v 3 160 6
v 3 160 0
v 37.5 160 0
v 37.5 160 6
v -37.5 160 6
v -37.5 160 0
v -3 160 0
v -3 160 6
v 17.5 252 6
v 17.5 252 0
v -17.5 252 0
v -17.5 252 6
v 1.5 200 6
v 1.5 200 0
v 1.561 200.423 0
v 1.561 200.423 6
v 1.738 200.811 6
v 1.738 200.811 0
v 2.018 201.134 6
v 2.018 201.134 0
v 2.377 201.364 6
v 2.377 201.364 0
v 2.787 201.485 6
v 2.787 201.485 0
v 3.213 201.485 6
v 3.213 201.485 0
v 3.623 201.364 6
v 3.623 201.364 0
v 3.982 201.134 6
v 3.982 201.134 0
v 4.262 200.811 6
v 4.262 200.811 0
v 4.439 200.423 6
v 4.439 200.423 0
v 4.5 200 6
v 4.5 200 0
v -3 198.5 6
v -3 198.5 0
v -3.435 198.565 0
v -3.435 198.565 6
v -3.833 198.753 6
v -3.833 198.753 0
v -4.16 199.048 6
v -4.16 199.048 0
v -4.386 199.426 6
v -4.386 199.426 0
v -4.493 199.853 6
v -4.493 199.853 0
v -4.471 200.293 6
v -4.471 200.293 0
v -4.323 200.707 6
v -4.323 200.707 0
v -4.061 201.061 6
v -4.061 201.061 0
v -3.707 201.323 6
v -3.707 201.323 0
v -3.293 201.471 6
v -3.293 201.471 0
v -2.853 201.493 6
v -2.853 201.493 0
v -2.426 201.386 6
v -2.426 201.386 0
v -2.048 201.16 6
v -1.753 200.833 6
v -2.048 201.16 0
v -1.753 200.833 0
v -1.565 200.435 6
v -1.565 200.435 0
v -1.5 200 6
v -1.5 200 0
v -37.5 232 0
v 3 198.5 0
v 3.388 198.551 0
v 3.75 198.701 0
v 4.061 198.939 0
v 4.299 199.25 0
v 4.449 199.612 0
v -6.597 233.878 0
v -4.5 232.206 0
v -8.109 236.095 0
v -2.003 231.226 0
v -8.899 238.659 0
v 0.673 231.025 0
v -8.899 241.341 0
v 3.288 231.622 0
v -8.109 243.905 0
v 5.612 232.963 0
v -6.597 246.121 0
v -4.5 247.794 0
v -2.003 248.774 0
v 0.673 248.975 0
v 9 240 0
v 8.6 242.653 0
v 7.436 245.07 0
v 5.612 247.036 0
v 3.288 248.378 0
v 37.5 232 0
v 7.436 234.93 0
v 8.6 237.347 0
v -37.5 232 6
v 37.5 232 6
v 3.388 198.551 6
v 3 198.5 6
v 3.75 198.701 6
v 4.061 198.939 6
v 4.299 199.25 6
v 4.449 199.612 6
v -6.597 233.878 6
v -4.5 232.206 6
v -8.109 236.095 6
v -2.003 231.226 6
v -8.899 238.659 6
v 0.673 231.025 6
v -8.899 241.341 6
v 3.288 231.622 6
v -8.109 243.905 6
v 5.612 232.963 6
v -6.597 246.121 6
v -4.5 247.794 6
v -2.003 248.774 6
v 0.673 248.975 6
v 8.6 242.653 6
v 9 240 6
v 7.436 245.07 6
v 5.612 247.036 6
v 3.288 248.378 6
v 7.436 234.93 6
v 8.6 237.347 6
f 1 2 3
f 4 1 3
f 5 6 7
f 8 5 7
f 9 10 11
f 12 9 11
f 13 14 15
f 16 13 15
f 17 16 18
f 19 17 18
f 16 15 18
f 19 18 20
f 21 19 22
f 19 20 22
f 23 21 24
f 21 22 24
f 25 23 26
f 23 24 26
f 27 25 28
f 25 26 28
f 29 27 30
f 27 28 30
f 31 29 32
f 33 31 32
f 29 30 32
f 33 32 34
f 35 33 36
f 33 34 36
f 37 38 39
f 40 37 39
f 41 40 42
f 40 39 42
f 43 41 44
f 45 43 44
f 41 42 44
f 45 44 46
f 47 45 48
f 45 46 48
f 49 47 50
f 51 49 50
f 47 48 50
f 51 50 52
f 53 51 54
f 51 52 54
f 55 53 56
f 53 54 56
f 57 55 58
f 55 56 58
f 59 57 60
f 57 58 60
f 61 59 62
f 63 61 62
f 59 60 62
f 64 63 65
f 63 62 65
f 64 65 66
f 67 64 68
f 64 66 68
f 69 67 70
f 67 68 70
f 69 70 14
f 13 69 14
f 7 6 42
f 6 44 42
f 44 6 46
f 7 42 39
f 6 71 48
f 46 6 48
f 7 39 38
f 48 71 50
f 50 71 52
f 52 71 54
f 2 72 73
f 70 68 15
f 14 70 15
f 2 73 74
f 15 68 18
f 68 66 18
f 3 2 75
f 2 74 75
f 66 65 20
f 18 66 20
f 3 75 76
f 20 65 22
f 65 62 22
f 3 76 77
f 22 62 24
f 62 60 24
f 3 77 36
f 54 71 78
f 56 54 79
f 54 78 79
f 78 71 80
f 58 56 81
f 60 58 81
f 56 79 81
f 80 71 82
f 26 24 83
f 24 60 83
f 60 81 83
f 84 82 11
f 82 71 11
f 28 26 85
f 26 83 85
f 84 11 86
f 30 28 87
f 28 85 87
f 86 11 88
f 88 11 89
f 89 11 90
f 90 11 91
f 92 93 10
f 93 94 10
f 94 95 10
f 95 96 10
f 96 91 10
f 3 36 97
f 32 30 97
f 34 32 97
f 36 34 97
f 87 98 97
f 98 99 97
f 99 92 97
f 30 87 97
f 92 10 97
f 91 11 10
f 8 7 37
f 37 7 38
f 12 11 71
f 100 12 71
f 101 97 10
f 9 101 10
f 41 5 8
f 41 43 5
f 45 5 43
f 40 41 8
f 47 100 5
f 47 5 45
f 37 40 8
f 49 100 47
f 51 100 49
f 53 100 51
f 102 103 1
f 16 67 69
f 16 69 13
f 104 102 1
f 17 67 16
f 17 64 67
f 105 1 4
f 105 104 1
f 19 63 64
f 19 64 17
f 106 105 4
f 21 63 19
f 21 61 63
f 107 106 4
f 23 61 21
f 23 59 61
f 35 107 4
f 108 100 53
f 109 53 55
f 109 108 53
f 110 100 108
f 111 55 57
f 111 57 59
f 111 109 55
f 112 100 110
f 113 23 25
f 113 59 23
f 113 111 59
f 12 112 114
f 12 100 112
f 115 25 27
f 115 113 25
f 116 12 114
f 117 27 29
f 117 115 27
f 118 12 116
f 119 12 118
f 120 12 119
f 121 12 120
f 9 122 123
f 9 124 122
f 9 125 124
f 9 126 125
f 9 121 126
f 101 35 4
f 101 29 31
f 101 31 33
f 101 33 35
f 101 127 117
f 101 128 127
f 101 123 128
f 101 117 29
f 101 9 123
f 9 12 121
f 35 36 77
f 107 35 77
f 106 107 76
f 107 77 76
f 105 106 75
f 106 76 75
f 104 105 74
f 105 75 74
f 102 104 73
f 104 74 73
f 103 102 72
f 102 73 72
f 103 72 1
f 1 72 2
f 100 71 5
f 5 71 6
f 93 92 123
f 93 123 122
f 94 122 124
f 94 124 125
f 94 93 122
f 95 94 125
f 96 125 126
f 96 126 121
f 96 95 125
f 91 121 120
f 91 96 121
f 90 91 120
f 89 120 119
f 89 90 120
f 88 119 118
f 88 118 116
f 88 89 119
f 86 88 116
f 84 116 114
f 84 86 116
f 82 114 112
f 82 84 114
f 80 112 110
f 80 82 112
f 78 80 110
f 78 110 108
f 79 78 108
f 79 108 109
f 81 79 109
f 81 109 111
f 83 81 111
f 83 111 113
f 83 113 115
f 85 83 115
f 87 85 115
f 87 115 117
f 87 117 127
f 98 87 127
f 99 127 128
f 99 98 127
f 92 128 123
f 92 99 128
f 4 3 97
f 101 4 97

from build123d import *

# Parameters (mm, degrees)
SKETCH1_R           = 9
BOSS_EXTRUDE1_DEPTH = 6


with BuildPart() as part:
    # Sketch1 → Boss-Extrude1 (new body)
    with BuildSketch(Plane.XY):
        with BuildLine():
            Line((3, 160), (37.5, 160))
            Line((37.5, 160), (37.5, 232.000025877))
            Line((37.5, 232.000025877), (17.5, 252.000025877))
            Line((17.5, 252.000025877), (-17.5, 252.000025877))
            Line((-17.5, 252.000025877), (-37.5, 232.000025877))
            Line((-37.5, 232.000025877), (-37.5, 160))
            Line((-37.5, 160), (-3, 160))
            Line((-3, 160), (-3, 198.5))
            ThreePointArc((-3, 198.5), (-4.060660172, 201.060660172), (-1.5, 200))
            Line((-1.5, 200), (1.5, 200))
            ThreePointArc((1.5, 200), (3, 201.5), (4.5, 200))
            ThreePointArc((4.5, 200), (4.060660172, 198.939339828), (3, 198.5))
            Line((3, 198.5), (3, 160))
        make_face()
        with Locations((9.65e-05, 239.99993797)):
            Circle(SKETCH1_R, mode=Mode.SUBTRACT)
    extrude(amount=BOSS_EXTRUDE1_DEPTH)


solid = part.part
